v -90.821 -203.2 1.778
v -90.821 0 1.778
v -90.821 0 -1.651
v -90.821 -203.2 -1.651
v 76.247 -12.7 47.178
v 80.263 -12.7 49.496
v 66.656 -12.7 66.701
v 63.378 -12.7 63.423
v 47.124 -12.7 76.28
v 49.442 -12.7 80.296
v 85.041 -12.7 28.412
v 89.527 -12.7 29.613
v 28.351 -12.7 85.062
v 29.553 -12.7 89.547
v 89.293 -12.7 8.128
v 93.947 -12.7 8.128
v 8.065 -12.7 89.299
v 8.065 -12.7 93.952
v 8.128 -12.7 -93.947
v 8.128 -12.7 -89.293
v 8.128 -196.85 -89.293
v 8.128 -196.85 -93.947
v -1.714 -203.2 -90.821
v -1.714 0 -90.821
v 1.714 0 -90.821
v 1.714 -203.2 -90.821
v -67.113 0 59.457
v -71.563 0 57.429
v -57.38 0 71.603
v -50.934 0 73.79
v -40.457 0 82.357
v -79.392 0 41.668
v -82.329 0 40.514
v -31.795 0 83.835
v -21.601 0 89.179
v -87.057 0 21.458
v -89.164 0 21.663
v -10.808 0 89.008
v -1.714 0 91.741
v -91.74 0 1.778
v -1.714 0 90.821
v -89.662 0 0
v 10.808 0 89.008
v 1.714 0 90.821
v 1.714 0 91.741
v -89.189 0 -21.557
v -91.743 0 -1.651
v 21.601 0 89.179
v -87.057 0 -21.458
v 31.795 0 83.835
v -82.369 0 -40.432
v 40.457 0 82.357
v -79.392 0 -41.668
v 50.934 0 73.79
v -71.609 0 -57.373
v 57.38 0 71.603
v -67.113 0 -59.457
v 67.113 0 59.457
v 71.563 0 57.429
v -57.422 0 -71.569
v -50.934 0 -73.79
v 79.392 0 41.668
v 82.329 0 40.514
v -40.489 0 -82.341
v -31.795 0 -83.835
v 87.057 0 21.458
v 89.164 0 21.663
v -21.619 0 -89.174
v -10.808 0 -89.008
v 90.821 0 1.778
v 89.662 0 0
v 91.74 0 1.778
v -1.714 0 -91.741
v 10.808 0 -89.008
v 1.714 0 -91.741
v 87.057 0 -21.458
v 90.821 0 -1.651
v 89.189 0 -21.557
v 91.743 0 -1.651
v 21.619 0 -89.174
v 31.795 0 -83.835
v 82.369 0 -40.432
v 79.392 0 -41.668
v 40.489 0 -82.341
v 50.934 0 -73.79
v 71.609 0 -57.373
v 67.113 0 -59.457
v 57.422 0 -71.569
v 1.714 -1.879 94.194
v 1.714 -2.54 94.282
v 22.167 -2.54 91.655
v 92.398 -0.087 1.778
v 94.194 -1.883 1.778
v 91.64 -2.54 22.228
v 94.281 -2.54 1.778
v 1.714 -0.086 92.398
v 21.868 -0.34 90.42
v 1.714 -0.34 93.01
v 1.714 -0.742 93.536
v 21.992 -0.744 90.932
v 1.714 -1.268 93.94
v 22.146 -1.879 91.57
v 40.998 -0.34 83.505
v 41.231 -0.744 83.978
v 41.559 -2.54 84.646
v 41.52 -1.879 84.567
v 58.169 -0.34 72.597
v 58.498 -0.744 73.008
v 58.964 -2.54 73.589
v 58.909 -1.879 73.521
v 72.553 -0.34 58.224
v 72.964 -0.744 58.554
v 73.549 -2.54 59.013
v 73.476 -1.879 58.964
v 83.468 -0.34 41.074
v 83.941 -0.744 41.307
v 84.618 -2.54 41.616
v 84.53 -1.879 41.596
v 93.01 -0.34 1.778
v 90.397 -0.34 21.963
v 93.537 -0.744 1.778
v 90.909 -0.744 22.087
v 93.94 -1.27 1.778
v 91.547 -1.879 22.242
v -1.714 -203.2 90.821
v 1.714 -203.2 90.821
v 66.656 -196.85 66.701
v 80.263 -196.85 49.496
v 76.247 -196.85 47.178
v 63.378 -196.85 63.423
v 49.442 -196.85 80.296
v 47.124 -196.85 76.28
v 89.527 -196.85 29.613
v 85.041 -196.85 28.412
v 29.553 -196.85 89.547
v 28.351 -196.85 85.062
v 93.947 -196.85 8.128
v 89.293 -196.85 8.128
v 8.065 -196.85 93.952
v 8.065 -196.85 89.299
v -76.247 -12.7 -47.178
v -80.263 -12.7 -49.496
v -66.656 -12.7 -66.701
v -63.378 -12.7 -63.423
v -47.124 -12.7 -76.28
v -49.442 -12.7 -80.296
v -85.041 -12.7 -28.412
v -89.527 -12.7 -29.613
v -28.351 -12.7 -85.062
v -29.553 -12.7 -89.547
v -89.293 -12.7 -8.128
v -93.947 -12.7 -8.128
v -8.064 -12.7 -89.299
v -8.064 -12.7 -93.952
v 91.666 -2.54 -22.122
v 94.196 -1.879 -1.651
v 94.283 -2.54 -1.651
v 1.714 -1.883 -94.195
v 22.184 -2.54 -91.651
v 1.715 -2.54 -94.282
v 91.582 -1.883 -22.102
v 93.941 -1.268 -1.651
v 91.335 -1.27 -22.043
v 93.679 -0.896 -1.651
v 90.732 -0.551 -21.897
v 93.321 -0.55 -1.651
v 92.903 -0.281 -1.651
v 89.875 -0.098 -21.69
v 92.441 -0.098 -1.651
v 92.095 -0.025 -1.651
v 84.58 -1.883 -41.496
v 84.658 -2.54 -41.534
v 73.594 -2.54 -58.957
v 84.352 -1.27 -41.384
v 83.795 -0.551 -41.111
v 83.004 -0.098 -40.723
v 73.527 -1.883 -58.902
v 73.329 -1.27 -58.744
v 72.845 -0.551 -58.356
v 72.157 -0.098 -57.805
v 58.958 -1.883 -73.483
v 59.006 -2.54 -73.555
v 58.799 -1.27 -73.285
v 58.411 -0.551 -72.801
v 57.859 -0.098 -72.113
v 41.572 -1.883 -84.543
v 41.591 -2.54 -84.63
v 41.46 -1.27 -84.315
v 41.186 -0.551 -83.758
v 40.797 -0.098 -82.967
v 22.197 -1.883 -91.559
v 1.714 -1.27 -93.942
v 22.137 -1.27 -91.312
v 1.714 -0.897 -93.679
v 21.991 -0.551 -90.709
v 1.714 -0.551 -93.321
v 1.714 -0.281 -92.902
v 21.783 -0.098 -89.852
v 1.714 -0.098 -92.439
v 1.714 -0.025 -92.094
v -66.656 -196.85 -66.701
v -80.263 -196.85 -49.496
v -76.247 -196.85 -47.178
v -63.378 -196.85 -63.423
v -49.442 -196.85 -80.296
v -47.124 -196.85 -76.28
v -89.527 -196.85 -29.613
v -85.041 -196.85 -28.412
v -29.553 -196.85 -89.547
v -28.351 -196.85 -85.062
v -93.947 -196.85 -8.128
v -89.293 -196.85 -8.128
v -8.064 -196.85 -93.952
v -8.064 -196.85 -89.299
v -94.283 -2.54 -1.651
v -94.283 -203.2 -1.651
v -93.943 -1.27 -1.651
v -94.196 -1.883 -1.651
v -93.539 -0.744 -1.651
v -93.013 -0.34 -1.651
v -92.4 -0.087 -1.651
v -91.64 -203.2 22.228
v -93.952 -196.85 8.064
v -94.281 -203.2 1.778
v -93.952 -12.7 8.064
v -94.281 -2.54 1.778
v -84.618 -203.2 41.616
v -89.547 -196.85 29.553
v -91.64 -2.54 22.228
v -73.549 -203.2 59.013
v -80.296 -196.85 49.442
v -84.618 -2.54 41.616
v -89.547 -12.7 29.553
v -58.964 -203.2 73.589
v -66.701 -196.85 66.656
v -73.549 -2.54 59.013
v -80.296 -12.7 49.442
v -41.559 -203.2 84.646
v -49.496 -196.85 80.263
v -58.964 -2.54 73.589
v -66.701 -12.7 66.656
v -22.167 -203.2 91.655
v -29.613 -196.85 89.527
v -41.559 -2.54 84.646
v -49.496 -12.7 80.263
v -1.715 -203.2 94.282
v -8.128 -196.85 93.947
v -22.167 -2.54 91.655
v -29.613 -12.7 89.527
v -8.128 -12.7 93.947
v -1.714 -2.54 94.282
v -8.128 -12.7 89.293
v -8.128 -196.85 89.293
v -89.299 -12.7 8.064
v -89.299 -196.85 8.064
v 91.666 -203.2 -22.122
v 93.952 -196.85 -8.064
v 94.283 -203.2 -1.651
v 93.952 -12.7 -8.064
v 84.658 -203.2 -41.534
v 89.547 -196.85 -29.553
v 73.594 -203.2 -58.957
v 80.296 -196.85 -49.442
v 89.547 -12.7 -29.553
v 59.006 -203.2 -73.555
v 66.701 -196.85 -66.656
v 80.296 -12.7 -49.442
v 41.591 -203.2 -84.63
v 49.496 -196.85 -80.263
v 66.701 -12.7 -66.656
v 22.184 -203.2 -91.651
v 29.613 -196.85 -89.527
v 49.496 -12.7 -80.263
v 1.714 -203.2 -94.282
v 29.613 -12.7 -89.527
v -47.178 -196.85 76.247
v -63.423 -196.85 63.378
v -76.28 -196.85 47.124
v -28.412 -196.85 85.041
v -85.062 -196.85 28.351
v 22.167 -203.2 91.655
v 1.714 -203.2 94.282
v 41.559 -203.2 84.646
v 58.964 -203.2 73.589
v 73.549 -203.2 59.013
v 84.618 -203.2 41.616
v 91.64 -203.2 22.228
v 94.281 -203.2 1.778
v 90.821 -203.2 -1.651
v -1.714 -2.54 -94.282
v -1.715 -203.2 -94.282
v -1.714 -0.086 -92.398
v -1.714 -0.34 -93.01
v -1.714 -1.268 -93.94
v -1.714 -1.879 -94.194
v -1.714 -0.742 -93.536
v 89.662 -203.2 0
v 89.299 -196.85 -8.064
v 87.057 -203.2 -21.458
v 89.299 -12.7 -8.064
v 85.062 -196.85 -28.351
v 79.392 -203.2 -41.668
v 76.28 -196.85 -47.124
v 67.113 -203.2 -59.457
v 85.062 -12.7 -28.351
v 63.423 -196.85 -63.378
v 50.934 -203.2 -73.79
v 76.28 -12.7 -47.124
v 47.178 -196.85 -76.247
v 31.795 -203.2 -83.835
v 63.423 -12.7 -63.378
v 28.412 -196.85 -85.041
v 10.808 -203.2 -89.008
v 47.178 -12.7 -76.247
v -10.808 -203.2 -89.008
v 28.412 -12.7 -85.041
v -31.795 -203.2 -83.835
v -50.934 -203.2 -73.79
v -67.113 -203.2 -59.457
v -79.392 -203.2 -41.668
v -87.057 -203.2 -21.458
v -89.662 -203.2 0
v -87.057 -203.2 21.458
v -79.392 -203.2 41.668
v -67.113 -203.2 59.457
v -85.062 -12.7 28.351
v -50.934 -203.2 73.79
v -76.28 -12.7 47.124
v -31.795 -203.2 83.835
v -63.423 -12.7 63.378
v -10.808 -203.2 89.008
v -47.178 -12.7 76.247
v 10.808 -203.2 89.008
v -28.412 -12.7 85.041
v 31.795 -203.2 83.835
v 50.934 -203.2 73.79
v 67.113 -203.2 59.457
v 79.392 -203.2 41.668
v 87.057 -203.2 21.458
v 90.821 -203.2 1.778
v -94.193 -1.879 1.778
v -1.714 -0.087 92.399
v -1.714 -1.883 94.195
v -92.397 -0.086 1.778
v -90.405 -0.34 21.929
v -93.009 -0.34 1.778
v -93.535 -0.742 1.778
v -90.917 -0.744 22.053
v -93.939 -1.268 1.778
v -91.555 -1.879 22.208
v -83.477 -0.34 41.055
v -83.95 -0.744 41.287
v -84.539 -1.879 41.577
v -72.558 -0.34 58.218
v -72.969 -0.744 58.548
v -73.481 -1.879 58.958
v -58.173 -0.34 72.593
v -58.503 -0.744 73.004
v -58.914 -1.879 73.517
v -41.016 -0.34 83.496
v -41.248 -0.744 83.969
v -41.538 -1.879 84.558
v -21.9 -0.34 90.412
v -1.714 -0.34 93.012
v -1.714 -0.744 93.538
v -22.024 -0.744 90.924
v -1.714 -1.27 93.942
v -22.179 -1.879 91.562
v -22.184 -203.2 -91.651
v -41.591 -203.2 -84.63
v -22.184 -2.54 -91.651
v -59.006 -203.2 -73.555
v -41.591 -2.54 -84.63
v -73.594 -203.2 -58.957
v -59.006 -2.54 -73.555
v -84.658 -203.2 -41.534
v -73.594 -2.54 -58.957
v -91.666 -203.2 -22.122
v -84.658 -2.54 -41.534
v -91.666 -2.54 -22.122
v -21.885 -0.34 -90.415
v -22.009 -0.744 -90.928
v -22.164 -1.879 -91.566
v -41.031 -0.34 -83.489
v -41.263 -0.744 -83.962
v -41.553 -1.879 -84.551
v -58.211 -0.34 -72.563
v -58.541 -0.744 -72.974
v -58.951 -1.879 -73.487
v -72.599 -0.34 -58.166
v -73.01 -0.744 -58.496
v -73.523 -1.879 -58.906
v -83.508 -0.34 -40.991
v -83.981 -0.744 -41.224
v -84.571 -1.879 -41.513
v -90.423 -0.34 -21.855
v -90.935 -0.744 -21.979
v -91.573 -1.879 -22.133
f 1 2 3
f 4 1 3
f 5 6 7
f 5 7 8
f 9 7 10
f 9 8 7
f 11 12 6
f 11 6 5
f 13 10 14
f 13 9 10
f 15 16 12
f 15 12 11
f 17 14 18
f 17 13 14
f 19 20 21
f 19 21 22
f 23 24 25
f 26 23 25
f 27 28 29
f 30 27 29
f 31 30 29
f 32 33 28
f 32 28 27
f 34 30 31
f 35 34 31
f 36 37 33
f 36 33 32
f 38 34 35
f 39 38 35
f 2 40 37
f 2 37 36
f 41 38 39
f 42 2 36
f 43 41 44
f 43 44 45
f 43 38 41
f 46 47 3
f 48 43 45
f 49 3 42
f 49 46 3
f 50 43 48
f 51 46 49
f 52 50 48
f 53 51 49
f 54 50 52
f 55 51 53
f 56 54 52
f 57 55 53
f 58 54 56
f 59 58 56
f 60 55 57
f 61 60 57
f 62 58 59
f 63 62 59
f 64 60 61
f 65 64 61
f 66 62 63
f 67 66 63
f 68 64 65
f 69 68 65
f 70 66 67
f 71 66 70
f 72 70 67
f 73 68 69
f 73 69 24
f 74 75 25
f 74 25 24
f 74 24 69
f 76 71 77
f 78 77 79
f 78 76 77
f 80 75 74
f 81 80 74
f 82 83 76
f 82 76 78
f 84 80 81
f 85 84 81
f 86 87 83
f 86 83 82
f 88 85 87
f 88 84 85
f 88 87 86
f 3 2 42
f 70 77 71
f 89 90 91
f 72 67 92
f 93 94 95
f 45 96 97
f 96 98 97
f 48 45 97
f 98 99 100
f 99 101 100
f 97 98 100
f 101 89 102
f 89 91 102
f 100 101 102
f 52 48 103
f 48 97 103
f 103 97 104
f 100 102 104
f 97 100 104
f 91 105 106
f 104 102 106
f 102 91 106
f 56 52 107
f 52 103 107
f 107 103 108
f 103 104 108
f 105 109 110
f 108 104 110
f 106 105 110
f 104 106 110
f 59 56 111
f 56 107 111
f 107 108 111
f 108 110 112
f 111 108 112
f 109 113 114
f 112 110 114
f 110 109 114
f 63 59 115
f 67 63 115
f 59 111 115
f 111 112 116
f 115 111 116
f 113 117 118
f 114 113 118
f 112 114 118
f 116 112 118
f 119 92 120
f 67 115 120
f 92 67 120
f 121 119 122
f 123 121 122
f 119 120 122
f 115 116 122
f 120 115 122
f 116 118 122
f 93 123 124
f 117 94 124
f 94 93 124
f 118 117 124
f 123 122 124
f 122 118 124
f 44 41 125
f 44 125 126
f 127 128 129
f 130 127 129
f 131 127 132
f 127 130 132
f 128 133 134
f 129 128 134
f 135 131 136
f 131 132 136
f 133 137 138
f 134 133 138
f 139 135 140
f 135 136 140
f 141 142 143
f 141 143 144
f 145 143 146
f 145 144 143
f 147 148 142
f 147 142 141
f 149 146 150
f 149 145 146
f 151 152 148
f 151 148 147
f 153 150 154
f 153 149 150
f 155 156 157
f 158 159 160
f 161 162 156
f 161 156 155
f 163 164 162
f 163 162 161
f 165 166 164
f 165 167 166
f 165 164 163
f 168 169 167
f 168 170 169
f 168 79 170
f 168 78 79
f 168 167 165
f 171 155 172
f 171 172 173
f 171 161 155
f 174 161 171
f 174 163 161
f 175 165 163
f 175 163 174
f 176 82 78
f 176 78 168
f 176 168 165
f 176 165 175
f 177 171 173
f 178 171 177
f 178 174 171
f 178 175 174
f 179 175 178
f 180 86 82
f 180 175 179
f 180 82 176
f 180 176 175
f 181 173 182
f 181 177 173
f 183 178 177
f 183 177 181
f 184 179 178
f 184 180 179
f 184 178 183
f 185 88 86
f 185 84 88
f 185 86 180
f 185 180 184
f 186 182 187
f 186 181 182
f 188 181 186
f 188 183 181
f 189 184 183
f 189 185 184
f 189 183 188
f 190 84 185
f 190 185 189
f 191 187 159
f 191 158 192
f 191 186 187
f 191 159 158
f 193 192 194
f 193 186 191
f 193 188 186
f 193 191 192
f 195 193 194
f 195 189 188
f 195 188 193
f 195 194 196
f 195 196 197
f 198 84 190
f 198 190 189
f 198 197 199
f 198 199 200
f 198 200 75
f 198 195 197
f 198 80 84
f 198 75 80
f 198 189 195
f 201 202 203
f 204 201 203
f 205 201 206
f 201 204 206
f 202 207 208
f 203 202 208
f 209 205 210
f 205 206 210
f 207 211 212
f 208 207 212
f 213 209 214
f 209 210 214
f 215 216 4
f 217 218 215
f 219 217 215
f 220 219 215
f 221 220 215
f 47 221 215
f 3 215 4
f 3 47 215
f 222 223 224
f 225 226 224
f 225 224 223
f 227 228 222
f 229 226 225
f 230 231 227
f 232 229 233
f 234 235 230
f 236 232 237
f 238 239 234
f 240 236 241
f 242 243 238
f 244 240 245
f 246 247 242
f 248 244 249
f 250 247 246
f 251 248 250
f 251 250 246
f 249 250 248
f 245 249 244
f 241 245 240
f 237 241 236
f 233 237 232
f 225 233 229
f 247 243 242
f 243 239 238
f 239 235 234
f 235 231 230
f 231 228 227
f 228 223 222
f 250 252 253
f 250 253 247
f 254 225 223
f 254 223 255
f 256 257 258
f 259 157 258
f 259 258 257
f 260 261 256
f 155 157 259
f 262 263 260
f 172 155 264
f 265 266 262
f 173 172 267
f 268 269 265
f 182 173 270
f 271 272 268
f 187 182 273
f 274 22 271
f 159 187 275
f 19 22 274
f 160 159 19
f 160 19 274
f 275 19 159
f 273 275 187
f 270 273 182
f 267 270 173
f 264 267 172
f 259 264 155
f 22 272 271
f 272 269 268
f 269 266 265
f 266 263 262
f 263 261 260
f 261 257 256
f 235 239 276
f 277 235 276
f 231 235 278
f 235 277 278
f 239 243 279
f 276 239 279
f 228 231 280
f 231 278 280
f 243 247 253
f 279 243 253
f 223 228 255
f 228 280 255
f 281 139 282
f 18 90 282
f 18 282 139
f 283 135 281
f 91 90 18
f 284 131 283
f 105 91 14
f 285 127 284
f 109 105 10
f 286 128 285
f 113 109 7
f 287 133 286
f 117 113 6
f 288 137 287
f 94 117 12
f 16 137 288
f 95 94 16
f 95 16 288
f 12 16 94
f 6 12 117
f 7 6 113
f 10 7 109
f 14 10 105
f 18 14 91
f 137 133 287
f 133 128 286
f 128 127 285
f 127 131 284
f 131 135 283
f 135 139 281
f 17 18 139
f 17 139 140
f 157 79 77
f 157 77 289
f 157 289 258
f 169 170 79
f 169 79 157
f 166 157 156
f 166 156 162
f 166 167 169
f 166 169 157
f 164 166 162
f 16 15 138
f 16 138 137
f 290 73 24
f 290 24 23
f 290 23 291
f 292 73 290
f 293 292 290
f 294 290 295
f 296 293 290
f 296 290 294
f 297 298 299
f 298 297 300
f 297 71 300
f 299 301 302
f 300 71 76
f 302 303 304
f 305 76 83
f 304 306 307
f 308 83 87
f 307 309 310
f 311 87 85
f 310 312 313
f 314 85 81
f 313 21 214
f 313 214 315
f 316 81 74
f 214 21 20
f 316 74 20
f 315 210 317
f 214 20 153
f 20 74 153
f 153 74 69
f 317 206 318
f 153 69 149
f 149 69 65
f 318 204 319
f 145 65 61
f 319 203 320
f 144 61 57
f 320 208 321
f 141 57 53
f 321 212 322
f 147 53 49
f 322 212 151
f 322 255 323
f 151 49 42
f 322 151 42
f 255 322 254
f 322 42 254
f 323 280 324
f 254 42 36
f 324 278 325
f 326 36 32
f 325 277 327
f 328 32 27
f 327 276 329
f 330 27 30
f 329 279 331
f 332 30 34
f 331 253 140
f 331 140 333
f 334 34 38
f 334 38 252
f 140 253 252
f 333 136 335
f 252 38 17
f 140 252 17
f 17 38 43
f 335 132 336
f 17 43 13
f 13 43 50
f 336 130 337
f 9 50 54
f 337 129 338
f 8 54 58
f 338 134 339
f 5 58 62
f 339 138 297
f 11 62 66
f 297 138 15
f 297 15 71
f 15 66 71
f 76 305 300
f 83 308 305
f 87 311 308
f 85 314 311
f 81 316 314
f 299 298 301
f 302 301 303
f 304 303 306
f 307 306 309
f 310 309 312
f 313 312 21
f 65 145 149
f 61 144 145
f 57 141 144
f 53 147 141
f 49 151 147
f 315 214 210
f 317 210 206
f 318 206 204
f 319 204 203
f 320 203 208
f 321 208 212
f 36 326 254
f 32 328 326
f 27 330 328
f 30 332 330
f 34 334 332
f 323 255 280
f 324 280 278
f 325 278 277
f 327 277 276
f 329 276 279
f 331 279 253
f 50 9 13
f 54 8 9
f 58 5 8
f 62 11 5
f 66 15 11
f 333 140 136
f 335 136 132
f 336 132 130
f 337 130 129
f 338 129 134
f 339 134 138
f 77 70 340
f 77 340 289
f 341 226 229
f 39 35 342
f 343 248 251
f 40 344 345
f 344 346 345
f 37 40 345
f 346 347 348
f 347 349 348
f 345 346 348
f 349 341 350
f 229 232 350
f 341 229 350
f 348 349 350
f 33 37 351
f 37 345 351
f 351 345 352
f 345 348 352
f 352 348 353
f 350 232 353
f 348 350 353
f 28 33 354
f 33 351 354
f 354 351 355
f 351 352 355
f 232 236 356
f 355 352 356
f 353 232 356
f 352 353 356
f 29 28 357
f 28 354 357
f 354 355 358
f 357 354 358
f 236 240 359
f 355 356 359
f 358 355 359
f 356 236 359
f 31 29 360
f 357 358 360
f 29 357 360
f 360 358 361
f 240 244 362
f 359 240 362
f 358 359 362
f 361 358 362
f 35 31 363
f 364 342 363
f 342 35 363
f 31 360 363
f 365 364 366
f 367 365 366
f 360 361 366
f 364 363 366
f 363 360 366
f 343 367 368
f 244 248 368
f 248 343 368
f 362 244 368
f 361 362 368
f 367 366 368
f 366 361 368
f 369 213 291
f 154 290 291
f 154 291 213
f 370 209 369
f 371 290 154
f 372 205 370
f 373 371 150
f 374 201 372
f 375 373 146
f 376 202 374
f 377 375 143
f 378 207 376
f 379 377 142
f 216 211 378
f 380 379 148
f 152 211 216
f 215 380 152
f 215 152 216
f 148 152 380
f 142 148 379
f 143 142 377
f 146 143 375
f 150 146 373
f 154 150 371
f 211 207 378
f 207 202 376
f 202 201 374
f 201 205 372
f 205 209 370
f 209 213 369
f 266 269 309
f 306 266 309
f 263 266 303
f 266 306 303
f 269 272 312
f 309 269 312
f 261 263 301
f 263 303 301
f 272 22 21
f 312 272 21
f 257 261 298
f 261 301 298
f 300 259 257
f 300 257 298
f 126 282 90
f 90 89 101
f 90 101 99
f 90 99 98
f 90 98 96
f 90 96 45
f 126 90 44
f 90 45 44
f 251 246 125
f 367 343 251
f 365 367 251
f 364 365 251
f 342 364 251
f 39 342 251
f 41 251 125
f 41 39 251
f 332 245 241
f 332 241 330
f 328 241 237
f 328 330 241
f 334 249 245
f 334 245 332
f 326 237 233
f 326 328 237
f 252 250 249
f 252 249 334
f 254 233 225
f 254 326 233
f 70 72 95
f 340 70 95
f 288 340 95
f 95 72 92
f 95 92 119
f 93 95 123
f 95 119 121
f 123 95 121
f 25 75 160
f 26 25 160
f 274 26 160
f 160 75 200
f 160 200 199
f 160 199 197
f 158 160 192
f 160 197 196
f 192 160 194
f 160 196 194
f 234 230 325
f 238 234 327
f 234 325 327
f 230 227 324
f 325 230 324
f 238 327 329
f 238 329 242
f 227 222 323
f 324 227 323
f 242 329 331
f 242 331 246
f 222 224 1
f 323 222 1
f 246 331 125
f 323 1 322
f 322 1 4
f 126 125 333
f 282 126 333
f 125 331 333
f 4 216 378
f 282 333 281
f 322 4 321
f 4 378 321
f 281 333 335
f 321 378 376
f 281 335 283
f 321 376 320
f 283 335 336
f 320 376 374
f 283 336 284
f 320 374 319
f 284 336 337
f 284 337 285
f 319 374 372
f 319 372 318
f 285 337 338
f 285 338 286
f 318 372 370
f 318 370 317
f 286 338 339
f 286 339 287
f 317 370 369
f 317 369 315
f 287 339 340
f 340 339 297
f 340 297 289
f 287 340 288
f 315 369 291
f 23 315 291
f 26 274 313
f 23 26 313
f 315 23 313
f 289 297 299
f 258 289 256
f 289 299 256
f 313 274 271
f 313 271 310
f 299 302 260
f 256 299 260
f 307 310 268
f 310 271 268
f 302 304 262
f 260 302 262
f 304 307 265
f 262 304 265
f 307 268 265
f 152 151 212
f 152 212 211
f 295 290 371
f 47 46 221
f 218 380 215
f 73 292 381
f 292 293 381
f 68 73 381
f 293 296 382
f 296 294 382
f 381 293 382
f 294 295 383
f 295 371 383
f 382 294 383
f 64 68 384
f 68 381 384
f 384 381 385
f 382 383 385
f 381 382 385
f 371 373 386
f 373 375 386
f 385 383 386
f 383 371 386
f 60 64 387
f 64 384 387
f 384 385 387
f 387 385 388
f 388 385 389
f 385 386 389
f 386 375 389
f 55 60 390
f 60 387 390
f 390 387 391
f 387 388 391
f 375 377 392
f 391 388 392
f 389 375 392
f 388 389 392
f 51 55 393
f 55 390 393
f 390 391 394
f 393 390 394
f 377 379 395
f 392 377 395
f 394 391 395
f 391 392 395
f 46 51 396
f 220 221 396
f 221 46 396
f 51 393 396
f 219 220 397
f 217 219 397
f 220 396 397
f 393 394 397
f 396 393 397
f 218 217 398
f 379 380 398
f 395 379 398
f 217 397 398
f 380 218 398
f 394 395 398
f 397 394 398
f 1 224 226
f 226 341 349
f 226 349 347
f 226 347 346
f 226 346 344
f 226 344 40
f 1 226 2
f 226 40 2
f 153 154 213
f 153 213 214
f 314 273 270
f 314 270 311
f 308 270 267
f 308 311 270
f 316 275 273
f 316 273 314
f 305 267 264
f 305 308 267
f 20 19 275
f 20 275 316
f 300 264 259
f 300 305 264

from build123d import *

# Parameters (mm, degrees)
SKETCH1_R           = 94.2975
SKETCH1_R_2         = 89.662
BOSS_EXTRUDE1_DEPTH = 203.2
SKETCH5_W           = 3.429
SKETCH5_H           = 5.08
SKETCH5_W_2         = 5.08
SKETCH5_H_2         = 3.429
CUT_EXTRUDE1_DEPTH  = 203.2
CUT_EXTRUDE2_START  = -12.7
CUT_EXTRUDE2_DEPTH  = 184.15
CIRPATTERN1_COUNT   = 4
FILLET1_R           = 2.54


with BuildPart() as part:
    # Sketch1 → Boss-Extrude1 (new body)
    with BuildSketch(Plane(origin=(0, 0, 0), x_dir=(1, 0, 0), z_dir=(0, 1, 0))):
        Circle(SKETCH1_R)
        Circle(SKETCH1_R_2, mode=Mode.SUBTRACT)
    extrude(amount=-BOSS_EXTRUDE1_DEPTH)

    # Sketch5 → Cut-Extrude1 (cut)
    with BuildSketch(Plane(origin=(0, 0, 0), x_dir=(1, 0, 0), z_dir=(0, 1, 0))):
        with Locations((0, 93.360875)):
            Rectangle(SKETCH5_W, SKETCH5_H)
        with Locations((0, -93.360875)):
            Rectangle(SKETCH5_W, SKETCH5_H)
        with Locations((-93.360875, -0.0635)):
            Rectangle(SKETCH5_W_2, SKETCH5_H_2)
        with Locations((93.360875, -0.0635)):
            Rectangle(SKETCH5_W_2, SKETCH5_H_2)
    extrude(amount=-CUT_EXTRUDE1_DEPTH, mode=Mode.SUBTRACT)

    # Sketch7 → Cut-Extrude2 (cut)
    with BuildSketch(Plane(origin=(0, 0, 0), x_dir=(1, 0, 0), z_dir=(0, 1, 0)).offset(CUT_EXTRUDE2_START)):
        with BuildLine():
            Line((89.292832075, -8.128), (93.946549283, -8.128))
            ThreePointArc((93.946549283, -8.128), (66.655864041, -66.700931742), (8.0645, -93.952021511))
            Line((8.0645, -93.952021511), (8.0645, -89.298589484))
            ThreePointArc((8.0645, -89.298589484), (63.378061476, -63.423146938), (89.292832075, -8.128))
        make_face()
    cut_extrude2 = extrude(amount=-CUT_EXTRUDE2_DEPTH, mode=Mode.SUBTRACT)

    # CirPattern1: Cut-Extrude2 ×4 about axis
    cirpattern1_axis = Axis((0, 0, 0), (0, 1, 0))
    for i in range(1, CIRPATTERN1_COUNT):
        add(cut_extrude2.rotate(cirpattern1_axis, i * 360 / CIRPATTERN1_COUNT), mode=Mode.SUBTRACT)

    # Fillet1
    fillet1_edges = [part.edges().sort_by_distance(p)[0] for p in [
        (66.700852134, 0, -66.655943702),
        (-66.700852134, 0, -66.655943702),
        (-66.655943427, 0, 66.700852409),
        (66.655943427, 0, 66.700852409),
    ]]
    fillet(fillet1_edges, radius=FILLET1_R)


solid = part.part
